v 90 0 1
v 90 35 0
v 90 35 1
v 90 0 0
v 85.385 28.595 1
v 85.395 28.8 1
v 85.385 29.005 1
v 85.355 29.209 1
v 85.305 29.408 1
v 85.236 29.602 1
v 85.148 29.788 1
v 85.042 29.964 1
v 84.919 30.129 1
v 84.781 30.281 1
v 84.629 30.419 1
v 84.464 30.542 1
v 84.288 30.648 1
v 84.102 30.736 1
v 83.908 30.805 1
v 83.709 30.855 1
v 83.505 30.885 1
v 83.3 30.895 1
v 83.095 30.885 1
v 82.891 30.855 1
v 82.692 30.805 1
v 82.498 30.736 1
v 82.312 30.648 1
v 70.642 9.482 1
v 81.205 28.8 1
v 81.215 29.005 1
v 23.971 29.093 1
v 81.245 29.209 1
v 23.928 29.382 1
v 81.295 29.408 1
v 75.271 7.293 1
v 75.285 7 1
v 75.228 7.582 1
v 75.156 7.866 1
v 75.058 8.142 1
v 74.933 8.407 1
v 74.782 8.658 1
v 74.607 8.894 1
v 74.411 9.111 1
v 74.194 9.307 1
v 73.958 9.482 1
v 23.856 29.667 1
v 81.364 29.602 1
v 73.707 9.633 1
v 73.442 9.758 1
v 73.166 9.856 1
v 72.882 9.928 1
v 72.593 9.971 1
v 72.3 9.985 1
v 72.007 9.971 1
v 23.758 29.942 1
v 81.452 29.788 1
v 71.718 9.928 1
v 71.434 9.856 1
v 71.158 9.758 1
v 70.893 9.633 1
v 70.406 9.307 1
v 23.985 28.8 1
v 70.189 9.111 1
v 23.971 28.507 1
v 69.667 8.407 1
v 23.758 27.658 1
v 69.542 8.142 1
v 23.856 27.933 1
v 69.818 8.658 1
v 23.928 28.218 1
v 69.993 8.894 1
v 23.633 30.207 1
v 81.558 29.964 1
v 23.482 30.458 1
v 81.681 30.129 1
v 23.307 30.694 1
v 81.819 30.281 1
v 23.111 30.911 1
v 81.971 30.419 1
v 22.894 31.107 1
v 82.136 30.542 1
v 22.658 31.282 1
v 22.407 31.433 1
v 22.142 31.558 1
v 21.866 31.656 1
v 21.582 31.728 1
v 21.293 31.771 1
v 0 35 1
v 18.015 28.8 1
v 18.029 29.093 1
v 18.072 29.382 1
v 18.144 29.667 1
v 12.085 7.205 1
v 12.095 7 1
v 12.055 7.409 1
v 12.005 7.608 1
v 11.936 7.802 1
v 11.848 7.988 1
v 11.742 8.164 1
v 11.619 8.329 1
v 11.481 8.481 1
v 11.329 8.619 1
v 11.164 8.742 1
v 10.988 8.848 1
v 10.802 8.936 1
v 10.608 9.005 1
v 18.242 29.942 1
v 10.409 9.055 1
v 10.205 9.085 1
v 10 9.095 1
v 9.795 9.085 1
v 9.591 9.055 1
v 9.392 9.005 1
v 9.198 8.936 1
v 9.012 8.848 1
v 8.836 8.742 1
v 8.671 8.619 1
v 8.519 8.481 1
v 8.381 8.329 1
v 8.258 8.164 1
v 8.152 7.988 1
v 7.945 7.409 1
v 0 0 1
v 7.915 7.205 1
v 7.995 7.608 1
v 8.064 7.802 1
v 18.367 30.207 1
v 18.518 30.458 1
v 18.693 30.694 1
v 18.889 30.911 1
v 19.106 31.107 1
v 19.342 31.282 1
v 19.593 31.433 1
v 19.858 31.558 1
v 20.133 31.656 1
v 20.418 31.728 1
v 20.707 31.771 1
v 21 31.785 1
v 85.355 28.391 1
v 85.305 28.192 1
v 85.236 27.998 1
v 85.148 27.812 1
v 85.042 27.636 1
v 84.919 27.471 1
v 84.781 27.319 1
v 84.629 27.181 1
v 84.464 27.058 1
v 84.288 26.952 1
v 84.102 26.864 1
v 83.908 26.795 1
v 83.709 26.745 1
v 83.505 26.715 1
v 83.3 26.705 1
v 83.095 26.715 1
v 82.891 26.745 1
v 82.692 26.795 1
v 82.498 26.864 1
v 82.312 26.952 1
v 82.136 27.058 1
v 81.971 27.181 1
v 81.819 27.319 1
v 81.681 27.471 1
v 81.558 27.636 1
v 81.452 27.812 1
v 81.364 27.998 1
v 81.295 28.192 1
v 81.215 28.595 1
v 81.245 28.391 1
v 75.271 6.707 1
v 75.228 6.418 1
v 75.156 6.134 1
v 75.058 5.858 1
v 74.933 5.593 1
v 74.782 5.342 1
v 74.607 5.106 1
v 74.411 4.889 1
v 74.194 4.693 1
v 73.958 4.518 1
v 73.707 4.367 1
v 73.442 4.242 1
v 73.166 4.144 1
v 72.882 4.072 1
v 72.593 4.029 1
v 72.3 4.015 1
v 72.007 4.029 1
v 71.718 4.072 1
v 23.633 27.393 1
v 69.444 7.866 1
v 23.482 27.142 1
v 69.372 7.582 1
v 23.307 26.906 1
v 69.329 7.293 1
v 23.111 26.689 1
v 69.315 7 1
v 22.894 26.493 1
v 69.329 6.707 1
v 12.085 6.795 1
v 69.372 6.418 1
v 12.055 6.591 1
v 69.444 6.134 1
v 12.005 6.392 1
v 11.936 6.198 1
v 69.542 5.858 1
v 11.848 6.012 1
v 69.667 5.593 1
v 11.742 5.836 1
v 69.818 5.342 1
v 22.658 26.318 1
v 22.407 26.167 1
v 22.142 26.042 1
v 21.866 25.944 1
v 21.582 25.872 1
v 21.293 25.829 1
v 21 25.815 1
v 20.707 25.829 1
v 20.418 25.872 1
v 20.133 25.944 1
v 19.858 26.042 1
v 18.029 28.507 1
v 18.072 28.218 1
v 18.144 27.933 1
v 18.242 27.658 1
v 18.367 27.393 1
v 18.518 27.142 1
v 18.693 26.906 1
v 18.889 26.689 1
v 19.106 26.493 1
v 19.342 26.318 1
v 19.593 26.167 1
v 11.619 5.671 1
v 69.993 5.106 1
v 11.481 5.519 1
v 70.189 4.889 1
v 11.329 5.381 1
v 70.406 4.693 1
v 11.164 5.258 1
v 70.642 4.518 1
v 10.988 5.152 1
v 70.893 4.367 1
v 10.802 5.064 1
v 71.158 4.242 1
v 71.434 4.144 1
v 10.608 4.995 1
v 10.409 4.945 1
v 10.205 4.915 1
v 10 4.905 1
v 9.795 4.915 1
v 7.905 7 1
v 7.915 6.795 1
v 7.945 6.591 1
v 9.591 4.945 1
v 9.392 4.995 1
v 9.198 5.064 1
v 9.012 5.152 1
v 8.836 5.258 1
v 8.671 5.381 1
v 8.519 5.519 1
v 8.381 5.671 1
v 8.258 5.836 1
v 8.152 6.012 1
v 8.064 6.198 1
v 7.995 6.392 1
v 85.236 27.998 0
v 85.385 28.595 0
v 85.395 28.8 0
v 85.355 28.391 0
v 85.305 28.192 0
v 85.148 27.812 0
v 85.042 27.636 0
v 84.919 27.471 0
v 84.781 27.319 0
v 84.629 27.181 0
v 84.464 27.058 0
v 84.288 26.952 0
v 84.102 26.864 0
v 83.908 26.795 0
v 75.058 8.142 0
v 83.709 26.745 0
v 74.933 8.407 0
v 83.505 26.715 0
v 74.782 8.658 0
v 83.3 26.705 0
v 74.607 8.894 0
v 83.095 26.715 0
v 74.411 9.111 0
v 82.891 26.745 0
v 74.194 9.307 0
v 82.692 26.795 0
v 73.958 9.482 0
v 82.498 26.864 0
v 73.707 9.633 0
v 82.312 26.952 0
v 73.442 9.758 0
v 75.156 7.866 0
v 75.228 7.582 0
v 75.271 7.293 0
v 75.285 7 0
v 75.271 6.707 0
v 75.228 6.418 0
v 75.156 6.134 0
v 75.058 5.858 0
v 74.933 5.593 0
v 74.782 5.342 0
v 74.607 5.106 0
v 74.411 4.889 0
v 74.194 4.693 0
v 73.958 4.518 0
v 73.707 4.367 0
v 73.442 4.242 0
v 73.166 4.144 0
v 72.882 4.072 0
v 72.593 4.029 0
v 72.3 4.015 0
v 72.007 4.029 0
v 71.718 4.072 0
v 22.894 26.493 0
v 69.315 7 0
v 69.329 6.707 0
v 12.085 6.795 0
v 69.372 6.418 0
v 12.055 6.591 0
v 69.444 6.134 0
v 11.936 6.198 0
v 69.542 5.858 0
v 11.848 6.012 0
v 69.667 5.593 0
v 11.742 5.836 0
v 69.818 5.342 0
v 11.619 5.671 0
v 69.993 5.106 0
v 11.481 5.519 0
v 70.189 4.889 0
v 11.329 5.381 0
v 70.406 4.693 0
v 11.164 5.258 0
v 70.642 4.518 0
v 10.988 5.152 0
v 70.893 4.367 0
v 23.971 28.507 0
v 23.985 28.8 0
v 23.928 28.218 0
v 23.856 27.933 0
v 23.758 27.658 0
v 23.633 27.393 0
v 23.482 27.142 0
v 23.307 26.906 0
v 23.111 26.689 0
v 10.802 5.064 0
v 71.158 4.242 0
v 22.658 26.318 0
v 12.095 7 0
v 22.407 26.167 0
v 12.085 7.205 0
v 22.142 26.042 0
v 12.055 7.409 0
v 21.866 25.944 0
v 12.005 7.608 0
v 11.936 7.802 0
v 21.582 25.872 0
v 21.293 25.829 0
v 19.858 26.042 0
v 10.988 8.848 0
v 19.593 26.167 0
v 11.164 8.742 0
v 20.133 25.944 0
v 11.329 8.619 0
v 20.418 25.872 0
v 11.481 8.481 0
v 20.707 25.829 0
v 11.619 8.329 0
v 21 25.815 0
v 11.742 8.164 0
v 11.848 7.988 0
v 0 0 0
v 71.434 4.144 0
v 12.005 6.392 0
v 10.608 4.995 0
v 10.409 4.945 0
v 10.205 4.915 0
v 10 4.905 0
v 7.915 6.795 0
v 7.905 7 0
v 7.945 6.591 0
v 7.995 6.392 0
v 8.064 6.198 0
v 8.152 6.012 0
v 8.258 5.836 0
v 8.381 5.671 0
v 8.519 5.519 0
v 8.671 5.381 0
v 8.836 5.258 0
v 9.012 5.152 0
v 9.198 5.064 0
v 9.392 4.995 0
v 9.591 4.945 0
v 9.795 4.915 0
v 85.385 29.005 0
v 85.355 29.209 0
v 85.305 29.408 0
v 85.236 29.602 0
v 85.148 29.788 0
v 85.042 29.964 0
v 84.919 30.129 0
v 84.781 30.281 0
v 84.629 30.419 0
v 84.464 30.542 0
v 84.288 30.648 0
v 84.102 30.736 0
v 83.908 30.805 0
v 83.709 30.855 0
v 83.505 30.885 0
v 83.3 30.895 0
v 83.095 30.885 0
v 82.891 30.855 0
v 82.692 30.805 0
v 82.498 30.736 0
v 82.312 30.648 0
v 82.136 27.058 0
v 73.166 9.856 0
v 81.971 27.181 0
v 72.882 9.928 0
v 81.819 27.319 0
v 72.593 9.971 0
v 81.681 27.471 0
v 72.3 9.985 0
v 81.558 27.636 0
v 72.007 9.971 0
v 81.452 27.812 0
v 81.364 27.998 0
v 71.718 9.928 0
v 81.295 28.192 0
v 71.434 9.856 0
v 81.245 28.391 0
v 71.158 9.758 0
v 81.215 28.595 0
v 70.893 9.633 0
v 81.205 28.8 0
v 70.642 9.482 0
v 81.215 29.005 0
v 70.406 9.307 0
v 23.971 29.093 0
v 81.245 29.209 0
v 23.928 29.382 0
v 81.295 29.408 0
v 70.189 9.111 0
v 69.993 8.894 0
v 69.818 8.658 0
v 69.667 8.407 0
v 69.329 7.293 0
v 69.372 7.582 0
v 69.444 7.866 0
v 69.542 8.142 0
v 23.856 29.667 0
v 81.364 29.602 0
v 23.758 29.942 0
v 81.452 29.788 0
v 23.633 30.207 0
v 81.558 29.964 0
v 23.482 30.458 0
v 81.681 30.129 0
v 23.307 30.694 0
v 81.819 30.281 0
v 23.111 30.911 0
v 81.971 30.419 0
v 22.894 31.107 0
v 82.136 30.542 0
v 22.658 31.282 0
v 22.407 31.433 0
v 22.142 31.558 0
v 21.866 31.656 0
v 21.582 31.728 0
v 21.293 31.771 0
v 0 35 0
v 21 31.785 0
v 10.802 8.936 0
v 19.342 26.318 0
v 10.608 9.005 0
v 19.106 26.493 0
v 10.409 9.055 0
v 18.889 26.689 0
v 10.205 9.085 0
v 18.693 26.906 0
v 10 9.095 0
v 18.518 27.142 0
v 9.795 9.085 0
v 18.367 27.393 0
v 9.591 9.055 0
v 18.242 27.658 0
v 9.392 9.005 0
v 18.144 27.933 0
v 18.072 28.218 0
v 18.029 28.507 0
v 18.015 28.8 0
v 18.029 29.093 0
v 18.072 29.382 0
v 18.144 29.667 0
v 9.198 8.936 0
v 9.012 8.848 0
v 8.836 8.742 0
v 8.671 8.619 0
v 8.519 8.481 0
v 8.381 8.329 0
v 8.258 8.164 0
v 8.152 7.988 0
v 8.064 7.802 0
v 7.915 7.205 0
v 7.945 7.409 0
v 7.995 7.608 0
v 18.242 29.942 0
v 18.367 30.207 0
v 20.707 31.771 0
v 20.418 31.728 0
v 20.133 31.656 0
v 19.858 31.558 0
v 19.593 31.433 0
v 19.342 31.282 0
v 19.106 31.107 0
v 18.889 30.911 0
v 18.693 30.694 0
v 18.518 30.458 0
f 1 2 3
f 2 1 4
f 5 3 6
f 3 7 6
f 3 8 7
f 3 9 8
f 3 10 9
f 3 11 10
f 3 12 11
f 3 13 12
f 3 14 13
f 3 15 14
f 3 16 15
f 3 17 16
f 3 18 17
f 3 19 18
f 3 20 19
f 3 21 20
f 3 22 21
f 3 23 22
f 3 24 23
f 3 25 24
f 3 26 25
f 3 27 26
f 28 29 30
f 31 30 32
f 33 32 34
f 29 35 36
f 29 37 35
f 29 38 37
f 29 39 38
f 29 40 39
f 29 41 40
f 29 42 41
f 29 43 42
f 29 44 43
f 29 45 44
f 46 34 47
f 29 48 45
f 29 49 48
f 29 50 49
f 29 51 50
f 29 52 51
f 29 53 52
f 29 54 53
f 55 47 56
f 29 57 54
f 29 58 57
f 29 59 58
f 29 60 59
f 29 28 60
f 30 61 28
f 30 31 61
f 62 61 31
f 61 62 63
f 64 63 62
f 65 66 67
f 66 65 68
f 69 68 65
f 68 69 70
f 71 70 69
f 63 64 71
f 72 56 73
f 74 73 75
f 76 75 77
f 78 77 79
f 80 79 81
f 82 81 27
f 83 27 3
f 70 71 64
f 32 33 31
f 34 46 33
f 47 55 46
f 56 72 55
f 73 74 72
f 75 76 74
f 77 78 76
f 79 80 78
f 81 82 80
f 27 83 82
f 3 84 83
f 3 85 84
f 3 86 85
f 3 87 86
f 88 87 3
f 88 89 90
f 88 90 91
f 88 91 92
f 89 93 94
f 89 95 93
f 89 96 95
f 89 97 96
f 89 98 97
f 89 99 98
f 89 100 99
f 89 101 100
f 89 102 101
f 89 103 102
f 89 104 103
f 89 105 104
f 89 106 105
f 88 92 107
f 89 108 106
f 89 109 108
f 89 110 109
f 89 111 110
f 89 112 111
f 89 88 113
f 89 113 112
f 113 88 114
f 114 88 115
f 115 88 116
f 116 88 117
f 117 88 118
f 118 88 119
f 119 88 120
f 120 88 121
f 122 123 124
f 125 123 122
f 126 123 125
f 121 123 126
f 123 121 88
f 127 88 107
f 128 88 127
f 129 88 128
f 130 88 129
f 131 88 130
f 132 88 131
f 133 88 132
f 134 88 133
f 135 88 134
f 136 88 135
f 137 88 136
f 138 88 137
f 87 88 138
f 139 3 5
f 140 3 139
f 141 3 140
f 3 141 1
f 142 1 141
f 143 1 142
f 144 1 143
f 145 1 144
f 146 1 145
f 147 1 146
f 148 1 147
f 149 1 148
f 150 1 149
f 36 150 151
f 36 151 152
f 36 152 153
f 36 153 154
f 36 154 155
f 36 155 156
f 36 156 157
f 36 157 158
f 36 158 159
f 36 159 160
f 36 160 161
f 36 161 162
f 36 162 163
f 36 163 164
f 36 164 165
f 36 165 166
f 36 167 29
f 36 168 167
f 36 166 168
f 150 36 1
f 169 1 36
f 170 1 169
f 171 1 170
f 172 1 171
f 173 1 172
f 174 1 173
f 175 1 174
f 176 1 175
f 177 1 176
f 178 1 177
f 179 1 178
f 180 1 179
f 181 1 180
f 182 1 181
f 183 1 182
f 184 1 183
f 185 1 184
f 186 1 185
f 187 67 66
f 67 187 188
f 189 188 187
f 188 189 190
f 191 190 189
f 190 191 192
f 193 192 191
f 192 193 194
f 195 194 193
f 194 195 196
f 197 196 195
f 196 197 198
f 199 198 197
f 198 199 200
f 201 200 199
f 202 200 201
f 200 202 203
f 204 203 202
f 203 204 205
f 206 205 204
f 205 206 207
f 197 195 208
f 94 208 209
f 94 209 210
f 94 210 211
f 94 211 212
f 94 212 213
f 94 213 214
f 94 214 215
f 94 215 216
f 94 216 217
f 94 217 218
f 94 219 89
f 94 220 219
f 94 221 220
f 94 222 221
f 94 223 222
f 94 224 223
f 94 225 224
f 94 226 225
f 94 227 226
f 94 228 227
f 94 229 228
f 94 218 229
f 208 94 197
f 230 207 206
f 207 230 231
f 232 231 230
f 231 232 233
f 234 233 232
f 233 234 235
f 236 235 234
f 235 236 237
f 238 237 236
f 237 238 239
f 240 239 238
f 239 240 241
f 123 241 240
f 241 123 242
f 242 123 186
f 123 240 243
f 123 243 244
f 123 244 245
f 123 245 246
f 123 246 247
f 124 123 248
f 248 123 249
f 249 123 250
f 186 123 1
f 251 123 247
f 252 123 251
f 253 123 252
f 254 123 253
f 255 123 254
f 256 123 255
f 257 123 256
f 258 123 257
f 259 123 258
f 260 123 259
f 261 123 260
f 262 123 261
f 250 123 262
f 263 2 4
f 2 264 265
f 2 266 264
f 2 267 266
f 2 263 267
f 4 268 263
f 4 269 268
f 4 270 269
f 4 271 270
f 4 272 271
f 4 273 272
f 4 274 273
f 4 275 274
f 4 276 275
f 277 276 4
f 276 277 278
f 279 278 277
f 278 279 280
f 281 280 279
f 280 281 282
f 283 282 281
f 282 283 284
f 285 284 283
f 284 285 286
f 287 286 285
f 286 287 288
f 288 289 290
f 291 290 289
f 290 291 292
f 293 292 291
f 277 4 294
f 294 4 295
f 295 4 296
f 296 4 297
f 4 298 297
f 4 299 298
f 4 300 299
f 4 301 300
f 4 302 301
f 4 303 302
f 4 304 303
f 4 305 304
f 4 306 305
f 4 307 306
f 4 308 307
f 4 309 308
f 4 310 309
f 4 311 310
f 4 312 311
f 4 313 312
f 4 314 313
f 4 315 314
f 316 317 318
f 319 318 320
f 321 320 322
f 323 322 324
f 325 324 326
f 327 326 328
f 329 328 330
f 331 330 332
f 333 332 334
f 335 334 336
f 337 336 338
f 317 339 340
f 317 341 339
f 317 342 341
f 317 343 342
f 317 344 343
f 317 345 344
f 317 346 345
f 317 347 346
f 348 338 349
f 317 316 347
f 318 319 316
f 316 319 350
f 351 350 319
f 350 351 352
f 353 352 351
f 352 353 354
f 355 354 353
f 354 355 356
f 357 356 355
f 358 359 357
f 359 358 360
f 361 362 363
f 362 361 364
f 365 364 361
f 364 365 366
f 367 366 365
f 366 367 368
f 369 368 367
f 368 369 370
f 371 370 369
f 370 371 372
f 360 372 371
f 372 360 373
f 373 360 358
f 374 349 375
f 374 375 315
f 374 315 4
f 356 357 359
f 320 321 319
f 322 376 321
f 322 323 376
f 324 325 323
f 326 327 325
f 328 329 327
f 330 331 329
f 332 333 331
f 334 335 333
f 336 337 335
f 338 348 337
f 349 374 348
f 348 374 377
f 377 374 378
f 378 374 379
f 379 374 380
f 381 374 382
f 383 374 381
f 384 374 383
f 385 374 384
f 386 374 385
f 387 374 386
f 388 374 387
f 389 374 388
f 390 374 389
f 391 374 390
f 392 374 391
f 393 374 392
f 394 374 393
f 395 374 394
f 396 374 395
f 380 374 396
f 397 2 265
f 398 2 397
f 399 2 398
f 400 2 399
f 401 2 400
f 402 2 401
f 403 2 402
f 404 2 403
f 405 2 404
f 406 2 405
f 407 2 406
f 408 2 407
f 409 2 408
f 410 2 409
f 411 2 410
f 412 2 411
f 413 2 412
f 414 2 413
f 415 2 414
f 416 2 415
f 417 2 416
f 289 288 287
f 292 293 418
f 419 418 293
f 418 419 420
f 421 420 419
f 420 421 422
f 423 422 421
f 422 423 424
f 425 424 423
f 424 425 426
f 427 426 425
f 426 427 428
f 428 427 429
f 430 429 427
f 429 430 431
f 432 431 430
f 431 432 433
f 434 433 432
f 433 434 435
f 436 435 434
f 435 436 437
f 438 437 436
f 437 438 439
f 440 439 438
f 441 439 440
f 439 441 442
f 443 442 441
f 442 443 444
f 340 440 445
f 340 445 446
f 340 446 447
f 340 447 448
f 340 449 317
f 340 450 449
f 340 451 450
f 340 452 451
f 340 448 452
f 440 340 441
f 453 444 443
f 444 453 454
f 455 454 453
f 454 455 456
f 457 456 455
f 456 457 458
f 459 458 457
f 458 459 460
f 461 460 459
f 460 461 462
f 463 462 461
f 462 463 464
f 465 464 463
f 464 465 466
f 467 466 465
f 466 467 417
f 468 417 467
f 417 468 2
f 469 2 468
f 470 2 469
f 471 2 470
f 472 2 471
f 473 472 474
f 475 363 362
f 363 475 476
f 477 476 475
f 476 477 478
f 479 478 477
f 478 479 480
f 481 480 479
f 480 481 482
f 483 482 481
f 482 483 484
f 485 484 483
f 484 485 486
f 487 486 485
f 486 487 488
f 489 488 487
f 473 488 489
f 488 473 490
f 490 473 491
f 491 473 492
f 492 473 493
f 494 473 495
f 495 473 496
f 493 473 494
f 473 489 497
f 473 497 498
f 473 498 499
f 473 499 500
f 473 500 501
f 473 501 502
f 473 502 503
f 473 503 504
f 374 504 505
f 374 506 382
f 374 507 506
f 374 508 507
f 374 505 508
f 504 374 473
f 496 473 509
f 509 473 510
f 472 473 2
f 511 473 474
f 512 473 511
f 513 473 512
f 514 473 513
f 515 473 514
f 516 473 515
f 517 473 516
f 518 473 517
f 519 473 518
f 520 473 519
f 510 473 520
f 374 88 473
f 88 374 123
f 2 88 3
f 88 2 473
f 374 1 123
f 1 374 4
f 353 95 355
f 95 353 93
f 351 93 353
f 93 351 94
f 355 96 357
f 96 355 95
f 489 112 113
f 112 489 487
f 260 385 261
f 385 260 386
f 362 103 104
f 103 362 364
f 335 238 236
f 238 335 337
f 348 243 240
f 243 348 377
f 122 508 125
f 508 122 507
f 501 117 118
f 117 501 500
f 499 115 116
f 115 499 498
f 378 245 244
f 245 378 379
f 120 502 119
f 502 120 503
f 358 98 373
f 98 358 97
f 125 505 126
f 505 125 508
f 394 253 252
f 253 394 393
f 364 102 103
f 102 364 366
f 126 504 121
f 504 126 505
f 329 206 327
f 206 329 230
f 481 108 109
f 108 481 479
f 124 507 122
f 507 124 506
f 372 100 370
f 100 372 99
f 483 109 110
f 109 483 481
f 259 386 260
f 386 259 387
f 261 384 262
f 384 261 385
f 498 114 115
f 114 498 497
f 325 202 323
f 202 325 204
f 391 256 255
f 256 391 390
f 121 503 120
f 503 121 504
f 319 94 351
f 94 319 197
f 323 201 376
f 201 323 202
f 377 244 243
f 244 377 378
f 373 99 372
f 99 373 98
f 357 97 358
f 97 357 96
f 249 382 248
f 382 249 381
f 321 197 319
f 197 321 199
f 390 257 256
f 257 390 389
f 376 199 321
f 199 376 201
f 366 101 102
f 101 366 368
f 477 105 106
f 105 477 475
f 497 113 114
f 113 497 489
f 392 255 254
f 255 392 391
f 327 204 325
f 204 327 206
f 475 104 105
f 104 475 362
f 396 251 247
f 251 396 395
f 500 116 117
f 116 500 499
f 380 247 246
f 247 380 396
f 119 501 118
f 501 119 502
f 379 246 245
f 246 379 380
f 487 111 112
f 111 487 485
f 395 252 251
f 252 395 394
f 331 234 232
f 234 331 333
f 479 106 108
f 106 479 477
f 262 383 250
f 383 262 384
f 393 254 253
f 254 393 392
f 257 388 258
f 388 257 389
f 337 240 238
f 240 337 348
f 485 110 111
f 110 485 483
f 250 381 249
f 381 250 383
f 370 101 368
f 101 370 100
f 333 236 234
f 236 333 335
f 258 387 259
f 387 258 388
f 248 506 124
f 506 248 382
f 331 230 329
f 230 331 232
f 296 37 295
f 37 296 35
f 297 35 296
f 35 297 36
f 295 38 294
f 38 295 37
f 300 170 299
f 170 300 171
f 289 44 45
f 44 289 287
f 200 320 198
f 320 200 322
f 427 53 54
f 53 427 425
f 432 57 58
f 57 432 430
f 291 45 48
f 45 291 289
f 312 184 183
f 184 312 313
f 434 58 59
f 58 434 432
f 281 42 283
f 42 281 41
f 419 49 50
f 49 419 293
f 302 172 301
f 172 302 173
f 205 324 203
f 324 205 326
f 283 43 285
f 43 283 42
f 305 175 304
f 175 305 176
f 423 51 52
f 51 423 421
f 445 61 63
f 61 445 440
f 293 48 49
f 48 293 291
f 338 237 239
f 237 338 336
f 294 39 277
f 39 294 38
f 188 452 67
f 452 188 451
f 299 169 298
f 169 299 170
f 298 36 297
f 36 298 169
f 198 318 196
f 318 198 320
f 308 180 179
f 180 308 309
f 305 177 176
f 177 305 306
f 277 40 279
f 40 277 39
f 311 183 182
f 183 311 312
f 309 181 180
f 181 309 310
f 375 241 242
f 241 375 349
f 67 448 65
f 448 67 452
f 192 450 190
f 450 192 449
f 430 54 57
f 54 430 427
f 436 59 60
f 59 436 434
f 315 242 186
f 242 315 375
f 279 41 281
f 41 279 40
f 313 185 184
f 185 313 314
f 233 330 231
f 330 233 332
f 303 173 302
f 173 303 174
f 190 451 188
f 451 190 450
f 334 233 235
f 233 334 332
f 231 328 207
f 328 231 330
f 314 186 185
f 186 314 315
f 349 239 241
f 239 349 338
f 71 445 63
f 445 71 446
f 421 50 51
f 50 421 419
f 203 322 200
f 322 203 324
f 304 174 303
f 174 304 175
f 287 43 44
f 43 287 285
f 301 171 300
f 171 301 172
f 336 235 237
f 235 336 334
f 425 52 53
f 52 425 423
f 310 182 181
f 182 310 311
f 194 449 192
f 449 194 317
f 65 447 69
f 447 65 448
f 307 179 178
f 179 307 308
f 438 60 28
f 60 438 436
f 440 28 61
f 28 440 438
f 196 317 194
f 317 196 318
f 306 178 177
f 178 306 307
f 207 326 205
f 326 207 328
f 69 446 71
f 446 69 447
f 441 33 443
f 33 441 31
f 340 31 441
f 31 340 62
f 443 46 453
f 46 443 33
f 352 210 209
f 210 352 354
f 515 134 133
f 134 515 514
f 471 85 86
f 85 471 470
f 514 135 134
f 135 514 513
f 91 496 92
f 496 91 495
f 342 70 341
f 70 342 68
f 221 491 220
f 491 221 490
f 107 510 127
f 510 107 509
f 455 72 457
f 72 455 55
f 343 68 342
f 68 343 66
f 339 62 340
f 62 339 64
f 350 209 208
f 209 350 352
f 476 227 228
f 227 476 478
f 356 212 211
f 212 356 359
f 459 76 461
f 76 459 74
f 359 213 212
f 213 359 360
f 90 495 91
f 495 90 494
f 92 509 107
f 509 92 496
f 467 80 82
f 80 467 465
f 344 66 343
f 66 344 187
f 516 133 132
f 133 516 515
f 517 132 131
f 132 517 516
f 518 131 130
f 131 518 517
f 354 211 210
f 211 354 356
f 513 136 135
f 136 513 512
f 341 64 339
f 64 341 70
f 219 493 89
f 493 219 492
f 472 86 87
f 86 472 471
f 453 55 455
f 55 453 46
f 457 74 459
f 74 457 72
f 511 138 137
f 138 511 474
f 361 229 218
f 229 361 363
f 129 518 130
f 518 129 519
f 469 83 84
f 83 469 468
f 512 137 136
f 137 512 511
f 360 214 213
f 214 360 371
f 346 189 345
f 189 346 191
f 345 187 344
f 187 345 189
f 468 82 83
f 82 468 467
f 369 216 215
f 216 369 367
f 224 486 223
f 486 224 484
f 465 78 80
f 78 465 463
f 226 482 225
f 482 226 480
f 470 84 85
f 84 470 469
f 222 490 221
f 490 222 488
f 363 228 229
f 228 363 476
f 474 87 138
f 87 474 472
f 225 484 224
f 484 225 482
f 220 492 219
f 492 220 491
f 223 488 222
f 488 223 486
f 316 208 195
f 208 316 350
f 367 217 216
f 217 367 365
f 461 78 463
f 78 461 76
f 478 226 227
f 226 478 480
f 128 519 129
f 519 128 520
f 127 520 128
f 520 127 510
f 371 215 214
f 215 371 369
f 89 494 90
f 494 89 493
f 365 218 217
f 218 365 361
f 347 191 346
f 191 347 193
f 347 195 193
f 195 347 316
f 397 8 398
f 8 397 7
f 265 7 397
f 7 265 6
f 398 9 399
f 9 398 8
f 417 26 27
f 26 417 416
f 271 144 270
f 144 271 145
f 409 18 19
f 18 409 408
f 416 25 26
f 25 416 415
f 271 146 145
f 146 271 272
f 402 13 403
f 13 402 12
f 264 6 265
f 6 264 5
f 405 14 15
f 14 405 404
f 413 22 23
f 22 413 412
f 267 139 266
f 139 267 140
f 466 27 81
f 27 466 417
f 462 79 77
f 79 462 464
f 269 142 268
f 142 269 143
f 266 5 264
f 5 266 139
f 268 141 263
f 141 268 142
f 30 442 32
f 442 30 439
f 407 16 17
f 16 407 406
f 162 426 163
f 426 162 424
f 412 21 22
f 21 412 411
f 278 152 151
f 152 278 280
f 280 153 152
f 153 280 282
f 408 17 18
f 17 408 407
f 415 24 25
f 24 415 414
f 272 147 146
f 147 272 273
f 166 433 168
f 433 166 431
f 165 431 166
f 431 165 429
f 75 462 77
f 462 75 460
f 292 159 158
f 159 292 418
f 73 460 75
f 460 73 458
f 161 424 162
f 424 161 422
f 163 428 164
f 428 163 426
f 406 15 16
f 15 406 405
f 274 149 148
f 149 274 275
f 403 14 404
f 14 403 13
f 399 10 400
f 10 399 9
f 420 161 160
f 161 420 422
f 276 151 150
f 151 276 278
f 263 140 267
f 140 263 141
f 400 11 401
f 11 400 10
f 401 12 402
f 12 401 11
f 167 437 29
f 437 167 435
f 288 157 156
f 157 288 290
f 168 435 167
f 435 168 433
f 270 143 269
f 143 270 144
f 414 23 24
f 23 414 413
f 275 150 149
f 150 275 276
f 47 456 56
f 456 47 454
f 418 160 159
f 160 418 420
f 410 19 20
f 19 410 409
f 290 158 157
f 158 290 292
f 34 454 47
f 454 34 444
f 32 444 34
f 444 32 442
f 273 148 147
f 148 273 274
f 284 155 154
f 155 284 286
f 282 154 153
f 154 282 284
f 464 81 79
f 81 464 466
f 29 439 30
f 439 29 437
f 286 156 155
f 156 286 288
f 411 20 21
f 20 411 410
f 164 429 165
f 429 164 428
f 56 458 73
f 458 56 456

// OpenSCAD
$fn=64;
large_heatpipe=5.97;
small_heatpipe=4.19;

horizontal_distance = 21.8;
vertical_distance = 62.3;

vertical_shift = 11;

bottom_distance = 10;
side_distance=7;

thickness=1;

difference() {
    cube([90,35,thickness]);
    translate([bottom_distance,side_distance,0])cylinder(d=small_heatpipe,h=thickness);
    translate([bottom_distance+vertical_distance,side_distance,0])cylinder(d=large_heatpipe,h=thickness);
    translate([bottom_distance+vertical_shift,side_distance+horizontal_distance,0])cylinder(d=large_heatpipe,h=thickness);
    translate([bottom_distance+vertical_shift+vertical_distance,side_distance+horizontal_distance,0])cylinder(d=small_heatpipe,h=thickness);
  
}
